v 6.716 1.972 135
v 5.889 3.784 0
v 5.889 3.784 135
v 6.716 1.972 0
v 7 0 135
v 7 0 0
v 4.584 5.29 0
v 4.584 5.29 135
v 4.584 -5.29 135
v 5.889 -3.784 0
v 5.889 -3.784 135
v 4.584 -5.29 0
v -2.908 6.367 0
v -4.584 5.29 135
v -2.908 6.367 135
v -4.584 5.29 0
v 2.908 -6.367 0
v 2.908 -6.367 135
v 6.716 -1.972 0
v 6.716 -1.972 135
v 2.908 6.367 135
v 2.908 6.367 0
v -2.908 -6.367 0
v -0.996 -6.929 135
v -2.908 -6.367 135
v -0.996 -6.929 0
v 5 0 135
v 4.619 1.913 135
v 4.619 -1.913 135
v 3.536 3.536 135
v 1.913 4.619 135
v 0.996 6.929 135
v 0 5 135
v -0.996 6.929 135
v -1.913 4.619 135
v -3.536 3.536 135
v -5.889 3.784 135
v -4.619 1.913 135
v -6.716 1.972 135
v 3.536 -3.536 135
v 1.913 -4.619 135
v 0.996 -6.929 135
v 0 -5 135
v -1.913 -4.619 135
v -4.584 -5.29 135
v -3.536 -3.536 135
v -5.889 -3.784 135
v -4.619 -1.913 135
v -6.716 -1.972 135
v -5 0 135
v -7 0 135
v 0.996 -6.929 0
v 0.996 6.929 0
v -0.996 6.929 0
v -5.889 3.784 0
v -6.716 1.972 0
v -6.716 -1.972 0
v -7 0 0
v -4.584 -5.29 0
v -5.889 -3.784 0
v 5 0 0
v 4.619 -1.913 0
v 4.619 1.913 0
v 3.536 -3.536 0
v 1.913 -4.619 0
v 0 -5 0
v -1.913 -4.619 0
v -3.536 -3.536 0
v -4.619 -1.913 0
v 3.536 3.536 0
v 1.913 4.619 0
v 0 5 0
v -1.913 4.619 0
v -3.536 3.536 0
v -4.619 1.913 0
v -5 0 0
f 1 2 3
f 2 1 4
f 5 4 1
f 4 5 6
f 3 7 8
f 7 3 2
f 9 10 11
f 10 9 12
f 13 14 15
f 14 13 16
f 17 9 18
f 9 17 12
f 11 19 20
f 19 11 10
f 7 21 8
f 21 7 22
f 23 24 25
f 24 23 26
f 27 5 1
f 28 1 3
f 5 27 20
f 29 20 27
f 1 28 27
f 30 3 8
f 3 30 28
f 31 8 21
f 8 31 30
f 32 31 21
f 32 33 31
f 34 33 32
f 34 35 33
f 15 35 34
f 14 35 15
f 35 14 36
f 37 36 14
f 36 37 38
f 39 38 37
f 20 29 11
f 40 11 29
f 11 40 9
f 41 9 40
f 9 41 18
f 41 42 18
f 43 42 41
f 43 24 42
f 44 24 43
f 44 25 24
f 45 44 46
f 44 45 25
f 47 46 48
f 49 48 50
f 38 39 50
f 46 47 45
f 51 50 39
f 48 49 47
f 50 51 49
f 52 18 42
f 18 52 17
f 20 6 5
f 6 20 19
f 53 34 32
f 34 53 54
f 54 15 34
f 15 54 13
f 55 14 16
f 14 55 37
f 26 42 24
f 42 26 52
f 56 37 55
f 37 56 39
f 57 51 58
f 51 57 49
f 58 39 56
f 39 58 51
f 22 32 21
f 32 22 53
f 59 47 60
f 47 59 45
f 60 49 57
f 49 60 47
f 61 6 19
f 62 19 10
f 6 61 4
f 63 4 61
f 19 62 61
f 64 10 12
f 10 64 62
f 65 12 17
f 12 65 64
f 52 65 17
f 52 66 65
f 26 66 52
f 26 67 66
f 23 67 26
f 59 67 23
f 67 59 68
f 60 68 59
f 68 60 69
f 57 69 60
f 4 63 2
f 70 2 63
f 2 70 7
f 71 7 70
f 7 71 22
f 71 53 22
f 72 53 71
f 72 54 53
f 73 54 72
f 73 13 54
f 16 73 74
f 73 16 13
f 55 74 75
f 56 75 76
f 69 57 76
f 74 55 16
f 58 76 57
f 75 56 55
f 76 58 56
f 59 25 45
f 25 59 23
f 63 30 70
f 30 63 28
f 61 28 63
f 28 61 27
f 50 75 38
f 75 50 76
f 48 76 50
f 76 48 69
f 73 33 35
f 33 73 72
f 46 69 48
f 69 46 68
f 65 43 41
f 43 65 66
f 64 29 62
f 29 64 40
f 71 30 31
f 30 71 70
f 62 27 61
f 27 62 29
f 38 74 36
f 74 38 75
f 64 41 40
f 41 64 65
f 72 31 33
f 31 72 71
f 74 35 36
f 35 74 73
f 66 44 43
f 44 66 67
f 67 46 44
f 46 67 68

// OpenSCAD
difference(){
    cylinder(135,7, 7);
    cylinder(140,5, 5);
}
